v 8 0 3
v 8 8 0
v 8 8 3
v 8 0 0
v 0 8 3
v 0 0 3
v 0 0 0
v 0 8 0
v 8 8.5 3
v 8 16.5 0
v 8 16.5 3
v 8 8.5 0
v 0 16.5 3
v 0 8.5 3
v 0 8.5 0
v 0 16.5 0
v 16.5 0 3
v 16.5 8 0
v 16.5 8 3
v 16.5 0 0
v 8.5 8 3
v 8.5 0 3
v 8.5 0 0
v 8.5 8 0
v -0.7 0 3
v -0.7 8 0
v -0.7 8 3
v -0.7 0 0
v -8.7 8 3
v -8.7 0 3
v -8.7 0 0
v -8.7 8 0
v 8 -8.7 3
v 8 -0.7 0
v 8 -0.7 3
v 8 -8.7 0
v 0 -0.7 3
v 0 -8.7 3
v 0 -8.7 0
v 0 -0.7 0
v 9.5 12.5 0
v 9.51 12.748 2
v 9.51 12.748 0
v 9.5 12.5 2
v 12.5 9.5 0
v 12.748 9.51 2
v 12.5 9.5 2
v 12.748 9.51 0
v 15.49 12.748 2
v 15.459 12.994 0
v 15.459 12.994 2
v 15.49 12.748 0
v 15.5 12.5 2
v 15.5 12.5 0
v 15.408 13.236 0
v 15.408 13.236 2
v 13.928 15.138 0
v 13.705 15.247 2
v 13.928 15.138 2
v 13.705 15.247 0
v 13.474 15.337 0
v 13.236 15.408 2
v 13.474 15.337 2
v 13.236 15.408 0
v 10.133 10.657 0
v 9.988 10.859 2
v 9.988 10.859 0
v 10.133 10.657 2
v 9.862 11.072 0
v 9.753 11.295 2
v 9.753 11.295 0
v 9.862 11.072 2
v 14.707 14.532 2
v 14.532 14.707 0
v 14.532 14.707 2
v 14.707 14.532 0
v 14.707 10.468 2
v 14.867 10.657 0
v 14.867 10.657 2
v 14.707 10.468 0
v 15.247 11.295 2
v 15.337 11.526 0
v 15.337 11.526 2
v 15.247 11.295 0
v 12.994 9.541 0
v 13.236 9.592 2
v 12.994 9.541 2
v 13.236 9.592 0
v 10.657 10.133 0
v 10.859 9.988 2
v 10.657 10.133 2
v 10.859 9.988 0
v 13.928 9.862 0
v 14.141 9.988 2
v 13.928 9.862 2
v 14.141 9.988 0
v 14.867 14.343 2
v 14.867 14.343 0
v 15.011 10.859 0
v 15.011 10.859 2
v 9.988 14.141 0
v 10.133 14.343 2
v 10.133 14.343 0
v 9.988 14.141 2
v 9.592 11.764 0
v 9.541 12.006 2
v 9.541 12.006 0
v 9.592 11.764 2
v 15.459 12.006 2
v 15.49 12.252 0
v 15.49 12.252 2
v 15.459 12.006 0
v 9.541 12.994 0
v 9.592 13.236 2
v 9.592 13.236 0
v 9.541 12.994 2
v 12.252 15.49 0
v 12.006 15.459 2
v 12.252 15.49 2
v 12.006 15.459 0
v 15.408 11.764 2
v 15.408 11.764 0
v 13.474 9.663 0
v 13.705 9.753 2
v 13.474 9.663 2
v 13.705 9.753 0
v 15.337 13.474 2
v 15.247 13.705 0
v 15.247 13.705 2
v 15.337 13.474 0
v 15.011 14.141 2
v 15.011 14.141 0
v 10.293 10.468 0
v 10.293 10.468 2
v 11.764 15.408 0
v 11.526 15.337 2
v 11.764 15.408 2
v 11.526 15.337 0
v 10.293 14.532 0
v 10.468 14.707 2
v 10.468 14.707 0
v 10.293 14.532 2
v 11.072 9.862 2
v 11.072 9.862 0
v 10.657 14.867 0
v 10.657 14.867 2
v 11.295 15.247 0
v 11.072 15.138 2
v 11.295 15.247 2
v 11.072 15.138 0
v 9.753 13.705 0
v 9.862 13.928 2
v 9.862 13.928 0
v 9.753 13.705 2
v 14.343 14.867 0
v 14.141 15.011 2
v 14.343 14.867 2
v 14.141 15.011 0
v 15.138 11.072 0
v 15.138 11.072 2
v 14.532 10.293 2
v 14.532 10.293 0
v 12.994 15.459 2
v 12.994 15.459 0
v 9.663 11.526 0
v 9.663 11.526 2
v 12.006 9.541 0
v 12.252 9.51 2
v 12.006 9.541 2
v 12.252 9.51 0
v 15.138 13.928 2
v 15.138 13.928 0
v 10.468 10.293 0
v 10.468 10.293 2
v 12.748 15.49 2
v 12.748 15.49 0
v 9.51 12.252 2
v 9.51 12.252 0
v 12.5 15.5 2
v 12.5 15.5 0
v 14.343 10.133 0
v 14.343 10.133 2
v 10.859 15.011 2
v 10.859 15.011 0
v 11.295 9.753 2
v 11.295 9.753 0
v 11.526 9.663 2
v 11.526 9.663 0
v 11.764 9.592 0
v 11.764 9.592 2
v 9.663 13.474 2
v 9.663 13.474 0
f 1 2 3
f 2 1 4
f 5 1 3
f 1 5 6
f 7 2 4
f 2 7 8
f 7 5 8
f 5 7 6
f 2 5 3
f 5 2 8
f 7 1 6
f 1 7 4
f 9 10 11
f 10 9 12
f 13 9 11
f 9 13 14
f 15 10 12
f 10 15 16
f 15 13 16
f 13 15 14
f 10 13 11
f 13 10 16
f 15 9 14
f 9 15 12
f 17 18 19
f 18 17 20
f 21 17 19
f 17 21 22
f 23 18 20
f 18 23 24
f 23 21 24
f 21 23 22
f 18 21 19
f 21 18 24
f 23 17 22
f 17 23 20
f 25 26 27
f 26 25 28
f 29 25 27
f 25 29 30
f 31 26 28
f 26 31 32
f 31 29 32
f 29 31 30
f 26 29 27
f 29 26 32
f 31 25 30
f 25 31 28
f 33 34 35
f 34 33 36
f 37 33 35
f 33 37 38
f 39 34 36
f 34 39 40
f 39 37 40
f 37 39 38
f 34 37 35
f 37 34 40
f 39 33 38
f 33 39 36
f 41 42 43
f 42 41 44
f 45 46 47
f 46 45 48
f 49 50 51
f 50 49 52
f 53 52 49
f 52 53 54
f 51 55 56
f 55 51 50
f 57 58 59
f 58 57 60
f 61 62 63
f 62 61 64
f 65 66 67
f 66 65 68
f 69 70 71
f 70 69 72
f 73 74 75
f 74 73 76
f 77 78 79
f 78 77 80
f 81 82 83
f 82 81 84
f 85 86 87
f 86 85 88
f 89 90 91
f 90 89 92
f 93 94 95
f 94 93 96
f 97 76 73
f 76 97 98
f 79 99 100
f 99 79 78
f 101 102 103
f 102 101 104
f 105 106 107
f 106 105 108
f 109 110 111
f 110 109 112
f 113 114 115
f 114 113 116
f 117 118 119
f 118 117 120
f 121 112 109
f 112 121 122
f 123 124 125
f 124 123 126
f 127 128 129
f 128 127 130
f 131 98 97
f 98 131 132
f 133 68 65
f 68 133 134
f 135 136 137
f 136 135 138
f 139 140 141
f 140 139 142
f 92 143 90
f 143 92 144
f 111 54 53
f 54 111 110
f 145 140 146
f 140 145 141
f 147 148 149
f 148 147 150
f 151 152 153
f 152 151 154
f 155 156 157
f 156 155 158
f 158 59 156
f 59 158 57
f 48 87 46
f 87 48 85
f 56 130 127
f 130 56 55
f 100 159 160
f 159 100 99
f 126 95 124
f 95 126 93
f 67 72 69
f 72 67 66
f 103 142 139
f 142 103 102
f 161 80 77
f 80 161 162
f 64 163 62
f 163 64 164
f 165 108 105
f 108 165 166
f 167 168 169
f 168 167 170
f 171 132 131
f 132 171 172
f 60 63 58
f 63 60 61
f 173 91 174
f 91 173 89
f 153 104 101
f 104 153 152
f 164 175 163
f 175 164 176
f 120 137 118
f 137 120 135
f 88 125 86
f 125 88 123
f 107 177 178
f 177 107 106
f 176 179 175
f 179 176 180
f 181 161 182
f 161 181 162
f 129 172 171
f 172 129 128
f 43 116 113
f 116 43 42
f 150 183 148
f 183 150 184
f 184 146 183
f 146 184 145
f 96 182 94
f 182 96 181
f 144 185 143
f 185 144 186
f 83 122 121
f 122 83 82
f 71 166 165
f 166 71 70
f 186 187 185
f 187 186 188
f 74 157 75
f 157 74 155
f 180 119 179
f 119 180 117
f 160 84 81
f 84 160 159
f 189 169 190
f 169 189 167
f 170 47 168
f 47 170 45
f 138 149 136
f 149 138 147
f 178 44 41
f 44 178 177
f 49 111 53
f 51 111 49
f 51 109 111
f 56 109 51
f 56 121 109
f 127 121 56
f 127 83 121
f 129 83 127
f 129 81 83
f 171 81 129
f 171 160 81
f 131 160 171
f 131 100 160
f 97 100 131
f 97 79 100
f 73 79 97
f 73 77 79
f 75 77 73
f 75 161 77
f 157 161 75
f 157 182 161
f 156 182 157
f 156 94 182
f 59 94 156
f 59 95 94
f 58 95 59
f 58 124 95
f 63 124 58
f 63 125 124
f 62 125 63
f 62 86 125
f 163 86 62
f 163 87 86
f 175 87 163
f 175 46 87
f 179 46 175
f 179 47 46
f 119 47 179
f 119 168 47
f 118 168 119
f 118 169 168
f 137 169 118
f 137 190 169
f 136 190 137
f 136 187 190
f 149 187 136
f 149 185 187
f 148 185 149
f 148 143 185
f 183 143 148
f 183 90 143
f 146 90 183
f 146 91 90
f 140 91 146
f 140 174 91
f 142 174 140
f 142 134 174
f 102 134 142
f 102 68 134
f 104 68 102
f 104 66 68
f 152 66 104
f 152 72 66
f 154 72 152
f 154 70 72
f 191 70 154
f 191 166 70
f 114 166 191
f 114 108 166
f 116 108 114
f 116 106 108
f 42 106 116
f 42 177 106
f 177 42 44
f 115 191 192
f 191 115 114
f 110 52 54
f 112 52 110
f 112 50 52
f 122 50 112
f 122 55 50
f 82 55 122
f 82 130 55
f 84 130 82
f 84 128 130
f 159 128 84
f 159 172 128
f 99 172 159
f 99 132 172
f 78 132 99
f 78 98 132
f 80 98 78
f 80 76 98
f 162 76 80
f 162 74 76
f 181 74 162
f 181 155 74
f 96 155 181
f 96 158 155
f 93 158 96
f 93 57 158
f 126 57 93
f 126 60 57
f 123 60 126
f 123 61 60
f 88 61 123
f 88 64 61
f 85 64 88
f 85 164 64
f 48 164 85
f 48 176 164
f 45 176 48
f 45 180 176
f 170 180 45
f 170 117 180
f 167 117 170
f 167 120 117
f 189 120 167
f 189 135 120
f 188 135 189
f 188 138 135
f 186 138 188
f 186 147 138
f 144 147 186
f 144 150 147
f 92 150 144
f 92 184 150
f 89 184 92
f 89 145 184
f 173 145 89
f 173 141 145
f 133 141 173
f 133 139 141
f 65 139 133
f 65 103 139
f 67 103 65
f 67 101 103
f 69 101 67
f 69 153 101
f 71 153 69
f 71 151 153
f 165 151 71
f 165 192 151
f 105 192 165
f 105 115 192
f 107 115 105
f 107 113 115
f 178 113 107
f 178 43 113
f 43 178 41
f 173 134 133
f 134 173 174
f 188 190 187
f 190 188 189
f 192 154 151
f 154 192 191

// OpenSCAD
// [FL_INDEX: keywords="openscad, 3d_parametric, Calibration__Tolerance___Parametric, csg_solid" | COT="Parametric OpenSCAD design from 3DCodeverse"]
// Title: Calibration: Tolerance | Parametric

//-----------Setup-----------//

//The total print height.
cubeHeight =3;

//The side of the squares.
cubeSide =8;

//The tolrance you want to test (distance between cubes).
tolerance =0.7;

//The second tolrance you want to test.
tolerance2 =0.5;

//-------End of setup-------//

//Disable $fn and $fa
$fn=0;
$fa=0.01;

//Use only $fs
//fine
$fs=0.25;

translate = cubeSide + tolerance;
translate2 = cubeSide + tolerance2;

markerTranslate = cubeSide + cubeSide/2 + tolerance2;

cube([cubeSide, cubeSide, cubeHeight]);

	translate([0, translate2, 0])
	{
		cube([cubeSide, cubeSide, cubeHeight]);
	}
	
	translate([translate2, 0, 0])
	{
		cube([cubeSide, cubeSide, cubeHeight]);
	}

	translate([translate*-1, 0, 0])
	{
		cube([cubeSide, cubeSide, cubeHeight]);
	}
	
	translate([0, translate*-1, 0])
	{
		cube([cubeSide, cubeSide, cubeHeight]);
	}

	translate([markerTranslate, markerTranslate, 0])
	{
		cylinder(2, cubeSide/2-1, cubeSide/2-1);
	}
